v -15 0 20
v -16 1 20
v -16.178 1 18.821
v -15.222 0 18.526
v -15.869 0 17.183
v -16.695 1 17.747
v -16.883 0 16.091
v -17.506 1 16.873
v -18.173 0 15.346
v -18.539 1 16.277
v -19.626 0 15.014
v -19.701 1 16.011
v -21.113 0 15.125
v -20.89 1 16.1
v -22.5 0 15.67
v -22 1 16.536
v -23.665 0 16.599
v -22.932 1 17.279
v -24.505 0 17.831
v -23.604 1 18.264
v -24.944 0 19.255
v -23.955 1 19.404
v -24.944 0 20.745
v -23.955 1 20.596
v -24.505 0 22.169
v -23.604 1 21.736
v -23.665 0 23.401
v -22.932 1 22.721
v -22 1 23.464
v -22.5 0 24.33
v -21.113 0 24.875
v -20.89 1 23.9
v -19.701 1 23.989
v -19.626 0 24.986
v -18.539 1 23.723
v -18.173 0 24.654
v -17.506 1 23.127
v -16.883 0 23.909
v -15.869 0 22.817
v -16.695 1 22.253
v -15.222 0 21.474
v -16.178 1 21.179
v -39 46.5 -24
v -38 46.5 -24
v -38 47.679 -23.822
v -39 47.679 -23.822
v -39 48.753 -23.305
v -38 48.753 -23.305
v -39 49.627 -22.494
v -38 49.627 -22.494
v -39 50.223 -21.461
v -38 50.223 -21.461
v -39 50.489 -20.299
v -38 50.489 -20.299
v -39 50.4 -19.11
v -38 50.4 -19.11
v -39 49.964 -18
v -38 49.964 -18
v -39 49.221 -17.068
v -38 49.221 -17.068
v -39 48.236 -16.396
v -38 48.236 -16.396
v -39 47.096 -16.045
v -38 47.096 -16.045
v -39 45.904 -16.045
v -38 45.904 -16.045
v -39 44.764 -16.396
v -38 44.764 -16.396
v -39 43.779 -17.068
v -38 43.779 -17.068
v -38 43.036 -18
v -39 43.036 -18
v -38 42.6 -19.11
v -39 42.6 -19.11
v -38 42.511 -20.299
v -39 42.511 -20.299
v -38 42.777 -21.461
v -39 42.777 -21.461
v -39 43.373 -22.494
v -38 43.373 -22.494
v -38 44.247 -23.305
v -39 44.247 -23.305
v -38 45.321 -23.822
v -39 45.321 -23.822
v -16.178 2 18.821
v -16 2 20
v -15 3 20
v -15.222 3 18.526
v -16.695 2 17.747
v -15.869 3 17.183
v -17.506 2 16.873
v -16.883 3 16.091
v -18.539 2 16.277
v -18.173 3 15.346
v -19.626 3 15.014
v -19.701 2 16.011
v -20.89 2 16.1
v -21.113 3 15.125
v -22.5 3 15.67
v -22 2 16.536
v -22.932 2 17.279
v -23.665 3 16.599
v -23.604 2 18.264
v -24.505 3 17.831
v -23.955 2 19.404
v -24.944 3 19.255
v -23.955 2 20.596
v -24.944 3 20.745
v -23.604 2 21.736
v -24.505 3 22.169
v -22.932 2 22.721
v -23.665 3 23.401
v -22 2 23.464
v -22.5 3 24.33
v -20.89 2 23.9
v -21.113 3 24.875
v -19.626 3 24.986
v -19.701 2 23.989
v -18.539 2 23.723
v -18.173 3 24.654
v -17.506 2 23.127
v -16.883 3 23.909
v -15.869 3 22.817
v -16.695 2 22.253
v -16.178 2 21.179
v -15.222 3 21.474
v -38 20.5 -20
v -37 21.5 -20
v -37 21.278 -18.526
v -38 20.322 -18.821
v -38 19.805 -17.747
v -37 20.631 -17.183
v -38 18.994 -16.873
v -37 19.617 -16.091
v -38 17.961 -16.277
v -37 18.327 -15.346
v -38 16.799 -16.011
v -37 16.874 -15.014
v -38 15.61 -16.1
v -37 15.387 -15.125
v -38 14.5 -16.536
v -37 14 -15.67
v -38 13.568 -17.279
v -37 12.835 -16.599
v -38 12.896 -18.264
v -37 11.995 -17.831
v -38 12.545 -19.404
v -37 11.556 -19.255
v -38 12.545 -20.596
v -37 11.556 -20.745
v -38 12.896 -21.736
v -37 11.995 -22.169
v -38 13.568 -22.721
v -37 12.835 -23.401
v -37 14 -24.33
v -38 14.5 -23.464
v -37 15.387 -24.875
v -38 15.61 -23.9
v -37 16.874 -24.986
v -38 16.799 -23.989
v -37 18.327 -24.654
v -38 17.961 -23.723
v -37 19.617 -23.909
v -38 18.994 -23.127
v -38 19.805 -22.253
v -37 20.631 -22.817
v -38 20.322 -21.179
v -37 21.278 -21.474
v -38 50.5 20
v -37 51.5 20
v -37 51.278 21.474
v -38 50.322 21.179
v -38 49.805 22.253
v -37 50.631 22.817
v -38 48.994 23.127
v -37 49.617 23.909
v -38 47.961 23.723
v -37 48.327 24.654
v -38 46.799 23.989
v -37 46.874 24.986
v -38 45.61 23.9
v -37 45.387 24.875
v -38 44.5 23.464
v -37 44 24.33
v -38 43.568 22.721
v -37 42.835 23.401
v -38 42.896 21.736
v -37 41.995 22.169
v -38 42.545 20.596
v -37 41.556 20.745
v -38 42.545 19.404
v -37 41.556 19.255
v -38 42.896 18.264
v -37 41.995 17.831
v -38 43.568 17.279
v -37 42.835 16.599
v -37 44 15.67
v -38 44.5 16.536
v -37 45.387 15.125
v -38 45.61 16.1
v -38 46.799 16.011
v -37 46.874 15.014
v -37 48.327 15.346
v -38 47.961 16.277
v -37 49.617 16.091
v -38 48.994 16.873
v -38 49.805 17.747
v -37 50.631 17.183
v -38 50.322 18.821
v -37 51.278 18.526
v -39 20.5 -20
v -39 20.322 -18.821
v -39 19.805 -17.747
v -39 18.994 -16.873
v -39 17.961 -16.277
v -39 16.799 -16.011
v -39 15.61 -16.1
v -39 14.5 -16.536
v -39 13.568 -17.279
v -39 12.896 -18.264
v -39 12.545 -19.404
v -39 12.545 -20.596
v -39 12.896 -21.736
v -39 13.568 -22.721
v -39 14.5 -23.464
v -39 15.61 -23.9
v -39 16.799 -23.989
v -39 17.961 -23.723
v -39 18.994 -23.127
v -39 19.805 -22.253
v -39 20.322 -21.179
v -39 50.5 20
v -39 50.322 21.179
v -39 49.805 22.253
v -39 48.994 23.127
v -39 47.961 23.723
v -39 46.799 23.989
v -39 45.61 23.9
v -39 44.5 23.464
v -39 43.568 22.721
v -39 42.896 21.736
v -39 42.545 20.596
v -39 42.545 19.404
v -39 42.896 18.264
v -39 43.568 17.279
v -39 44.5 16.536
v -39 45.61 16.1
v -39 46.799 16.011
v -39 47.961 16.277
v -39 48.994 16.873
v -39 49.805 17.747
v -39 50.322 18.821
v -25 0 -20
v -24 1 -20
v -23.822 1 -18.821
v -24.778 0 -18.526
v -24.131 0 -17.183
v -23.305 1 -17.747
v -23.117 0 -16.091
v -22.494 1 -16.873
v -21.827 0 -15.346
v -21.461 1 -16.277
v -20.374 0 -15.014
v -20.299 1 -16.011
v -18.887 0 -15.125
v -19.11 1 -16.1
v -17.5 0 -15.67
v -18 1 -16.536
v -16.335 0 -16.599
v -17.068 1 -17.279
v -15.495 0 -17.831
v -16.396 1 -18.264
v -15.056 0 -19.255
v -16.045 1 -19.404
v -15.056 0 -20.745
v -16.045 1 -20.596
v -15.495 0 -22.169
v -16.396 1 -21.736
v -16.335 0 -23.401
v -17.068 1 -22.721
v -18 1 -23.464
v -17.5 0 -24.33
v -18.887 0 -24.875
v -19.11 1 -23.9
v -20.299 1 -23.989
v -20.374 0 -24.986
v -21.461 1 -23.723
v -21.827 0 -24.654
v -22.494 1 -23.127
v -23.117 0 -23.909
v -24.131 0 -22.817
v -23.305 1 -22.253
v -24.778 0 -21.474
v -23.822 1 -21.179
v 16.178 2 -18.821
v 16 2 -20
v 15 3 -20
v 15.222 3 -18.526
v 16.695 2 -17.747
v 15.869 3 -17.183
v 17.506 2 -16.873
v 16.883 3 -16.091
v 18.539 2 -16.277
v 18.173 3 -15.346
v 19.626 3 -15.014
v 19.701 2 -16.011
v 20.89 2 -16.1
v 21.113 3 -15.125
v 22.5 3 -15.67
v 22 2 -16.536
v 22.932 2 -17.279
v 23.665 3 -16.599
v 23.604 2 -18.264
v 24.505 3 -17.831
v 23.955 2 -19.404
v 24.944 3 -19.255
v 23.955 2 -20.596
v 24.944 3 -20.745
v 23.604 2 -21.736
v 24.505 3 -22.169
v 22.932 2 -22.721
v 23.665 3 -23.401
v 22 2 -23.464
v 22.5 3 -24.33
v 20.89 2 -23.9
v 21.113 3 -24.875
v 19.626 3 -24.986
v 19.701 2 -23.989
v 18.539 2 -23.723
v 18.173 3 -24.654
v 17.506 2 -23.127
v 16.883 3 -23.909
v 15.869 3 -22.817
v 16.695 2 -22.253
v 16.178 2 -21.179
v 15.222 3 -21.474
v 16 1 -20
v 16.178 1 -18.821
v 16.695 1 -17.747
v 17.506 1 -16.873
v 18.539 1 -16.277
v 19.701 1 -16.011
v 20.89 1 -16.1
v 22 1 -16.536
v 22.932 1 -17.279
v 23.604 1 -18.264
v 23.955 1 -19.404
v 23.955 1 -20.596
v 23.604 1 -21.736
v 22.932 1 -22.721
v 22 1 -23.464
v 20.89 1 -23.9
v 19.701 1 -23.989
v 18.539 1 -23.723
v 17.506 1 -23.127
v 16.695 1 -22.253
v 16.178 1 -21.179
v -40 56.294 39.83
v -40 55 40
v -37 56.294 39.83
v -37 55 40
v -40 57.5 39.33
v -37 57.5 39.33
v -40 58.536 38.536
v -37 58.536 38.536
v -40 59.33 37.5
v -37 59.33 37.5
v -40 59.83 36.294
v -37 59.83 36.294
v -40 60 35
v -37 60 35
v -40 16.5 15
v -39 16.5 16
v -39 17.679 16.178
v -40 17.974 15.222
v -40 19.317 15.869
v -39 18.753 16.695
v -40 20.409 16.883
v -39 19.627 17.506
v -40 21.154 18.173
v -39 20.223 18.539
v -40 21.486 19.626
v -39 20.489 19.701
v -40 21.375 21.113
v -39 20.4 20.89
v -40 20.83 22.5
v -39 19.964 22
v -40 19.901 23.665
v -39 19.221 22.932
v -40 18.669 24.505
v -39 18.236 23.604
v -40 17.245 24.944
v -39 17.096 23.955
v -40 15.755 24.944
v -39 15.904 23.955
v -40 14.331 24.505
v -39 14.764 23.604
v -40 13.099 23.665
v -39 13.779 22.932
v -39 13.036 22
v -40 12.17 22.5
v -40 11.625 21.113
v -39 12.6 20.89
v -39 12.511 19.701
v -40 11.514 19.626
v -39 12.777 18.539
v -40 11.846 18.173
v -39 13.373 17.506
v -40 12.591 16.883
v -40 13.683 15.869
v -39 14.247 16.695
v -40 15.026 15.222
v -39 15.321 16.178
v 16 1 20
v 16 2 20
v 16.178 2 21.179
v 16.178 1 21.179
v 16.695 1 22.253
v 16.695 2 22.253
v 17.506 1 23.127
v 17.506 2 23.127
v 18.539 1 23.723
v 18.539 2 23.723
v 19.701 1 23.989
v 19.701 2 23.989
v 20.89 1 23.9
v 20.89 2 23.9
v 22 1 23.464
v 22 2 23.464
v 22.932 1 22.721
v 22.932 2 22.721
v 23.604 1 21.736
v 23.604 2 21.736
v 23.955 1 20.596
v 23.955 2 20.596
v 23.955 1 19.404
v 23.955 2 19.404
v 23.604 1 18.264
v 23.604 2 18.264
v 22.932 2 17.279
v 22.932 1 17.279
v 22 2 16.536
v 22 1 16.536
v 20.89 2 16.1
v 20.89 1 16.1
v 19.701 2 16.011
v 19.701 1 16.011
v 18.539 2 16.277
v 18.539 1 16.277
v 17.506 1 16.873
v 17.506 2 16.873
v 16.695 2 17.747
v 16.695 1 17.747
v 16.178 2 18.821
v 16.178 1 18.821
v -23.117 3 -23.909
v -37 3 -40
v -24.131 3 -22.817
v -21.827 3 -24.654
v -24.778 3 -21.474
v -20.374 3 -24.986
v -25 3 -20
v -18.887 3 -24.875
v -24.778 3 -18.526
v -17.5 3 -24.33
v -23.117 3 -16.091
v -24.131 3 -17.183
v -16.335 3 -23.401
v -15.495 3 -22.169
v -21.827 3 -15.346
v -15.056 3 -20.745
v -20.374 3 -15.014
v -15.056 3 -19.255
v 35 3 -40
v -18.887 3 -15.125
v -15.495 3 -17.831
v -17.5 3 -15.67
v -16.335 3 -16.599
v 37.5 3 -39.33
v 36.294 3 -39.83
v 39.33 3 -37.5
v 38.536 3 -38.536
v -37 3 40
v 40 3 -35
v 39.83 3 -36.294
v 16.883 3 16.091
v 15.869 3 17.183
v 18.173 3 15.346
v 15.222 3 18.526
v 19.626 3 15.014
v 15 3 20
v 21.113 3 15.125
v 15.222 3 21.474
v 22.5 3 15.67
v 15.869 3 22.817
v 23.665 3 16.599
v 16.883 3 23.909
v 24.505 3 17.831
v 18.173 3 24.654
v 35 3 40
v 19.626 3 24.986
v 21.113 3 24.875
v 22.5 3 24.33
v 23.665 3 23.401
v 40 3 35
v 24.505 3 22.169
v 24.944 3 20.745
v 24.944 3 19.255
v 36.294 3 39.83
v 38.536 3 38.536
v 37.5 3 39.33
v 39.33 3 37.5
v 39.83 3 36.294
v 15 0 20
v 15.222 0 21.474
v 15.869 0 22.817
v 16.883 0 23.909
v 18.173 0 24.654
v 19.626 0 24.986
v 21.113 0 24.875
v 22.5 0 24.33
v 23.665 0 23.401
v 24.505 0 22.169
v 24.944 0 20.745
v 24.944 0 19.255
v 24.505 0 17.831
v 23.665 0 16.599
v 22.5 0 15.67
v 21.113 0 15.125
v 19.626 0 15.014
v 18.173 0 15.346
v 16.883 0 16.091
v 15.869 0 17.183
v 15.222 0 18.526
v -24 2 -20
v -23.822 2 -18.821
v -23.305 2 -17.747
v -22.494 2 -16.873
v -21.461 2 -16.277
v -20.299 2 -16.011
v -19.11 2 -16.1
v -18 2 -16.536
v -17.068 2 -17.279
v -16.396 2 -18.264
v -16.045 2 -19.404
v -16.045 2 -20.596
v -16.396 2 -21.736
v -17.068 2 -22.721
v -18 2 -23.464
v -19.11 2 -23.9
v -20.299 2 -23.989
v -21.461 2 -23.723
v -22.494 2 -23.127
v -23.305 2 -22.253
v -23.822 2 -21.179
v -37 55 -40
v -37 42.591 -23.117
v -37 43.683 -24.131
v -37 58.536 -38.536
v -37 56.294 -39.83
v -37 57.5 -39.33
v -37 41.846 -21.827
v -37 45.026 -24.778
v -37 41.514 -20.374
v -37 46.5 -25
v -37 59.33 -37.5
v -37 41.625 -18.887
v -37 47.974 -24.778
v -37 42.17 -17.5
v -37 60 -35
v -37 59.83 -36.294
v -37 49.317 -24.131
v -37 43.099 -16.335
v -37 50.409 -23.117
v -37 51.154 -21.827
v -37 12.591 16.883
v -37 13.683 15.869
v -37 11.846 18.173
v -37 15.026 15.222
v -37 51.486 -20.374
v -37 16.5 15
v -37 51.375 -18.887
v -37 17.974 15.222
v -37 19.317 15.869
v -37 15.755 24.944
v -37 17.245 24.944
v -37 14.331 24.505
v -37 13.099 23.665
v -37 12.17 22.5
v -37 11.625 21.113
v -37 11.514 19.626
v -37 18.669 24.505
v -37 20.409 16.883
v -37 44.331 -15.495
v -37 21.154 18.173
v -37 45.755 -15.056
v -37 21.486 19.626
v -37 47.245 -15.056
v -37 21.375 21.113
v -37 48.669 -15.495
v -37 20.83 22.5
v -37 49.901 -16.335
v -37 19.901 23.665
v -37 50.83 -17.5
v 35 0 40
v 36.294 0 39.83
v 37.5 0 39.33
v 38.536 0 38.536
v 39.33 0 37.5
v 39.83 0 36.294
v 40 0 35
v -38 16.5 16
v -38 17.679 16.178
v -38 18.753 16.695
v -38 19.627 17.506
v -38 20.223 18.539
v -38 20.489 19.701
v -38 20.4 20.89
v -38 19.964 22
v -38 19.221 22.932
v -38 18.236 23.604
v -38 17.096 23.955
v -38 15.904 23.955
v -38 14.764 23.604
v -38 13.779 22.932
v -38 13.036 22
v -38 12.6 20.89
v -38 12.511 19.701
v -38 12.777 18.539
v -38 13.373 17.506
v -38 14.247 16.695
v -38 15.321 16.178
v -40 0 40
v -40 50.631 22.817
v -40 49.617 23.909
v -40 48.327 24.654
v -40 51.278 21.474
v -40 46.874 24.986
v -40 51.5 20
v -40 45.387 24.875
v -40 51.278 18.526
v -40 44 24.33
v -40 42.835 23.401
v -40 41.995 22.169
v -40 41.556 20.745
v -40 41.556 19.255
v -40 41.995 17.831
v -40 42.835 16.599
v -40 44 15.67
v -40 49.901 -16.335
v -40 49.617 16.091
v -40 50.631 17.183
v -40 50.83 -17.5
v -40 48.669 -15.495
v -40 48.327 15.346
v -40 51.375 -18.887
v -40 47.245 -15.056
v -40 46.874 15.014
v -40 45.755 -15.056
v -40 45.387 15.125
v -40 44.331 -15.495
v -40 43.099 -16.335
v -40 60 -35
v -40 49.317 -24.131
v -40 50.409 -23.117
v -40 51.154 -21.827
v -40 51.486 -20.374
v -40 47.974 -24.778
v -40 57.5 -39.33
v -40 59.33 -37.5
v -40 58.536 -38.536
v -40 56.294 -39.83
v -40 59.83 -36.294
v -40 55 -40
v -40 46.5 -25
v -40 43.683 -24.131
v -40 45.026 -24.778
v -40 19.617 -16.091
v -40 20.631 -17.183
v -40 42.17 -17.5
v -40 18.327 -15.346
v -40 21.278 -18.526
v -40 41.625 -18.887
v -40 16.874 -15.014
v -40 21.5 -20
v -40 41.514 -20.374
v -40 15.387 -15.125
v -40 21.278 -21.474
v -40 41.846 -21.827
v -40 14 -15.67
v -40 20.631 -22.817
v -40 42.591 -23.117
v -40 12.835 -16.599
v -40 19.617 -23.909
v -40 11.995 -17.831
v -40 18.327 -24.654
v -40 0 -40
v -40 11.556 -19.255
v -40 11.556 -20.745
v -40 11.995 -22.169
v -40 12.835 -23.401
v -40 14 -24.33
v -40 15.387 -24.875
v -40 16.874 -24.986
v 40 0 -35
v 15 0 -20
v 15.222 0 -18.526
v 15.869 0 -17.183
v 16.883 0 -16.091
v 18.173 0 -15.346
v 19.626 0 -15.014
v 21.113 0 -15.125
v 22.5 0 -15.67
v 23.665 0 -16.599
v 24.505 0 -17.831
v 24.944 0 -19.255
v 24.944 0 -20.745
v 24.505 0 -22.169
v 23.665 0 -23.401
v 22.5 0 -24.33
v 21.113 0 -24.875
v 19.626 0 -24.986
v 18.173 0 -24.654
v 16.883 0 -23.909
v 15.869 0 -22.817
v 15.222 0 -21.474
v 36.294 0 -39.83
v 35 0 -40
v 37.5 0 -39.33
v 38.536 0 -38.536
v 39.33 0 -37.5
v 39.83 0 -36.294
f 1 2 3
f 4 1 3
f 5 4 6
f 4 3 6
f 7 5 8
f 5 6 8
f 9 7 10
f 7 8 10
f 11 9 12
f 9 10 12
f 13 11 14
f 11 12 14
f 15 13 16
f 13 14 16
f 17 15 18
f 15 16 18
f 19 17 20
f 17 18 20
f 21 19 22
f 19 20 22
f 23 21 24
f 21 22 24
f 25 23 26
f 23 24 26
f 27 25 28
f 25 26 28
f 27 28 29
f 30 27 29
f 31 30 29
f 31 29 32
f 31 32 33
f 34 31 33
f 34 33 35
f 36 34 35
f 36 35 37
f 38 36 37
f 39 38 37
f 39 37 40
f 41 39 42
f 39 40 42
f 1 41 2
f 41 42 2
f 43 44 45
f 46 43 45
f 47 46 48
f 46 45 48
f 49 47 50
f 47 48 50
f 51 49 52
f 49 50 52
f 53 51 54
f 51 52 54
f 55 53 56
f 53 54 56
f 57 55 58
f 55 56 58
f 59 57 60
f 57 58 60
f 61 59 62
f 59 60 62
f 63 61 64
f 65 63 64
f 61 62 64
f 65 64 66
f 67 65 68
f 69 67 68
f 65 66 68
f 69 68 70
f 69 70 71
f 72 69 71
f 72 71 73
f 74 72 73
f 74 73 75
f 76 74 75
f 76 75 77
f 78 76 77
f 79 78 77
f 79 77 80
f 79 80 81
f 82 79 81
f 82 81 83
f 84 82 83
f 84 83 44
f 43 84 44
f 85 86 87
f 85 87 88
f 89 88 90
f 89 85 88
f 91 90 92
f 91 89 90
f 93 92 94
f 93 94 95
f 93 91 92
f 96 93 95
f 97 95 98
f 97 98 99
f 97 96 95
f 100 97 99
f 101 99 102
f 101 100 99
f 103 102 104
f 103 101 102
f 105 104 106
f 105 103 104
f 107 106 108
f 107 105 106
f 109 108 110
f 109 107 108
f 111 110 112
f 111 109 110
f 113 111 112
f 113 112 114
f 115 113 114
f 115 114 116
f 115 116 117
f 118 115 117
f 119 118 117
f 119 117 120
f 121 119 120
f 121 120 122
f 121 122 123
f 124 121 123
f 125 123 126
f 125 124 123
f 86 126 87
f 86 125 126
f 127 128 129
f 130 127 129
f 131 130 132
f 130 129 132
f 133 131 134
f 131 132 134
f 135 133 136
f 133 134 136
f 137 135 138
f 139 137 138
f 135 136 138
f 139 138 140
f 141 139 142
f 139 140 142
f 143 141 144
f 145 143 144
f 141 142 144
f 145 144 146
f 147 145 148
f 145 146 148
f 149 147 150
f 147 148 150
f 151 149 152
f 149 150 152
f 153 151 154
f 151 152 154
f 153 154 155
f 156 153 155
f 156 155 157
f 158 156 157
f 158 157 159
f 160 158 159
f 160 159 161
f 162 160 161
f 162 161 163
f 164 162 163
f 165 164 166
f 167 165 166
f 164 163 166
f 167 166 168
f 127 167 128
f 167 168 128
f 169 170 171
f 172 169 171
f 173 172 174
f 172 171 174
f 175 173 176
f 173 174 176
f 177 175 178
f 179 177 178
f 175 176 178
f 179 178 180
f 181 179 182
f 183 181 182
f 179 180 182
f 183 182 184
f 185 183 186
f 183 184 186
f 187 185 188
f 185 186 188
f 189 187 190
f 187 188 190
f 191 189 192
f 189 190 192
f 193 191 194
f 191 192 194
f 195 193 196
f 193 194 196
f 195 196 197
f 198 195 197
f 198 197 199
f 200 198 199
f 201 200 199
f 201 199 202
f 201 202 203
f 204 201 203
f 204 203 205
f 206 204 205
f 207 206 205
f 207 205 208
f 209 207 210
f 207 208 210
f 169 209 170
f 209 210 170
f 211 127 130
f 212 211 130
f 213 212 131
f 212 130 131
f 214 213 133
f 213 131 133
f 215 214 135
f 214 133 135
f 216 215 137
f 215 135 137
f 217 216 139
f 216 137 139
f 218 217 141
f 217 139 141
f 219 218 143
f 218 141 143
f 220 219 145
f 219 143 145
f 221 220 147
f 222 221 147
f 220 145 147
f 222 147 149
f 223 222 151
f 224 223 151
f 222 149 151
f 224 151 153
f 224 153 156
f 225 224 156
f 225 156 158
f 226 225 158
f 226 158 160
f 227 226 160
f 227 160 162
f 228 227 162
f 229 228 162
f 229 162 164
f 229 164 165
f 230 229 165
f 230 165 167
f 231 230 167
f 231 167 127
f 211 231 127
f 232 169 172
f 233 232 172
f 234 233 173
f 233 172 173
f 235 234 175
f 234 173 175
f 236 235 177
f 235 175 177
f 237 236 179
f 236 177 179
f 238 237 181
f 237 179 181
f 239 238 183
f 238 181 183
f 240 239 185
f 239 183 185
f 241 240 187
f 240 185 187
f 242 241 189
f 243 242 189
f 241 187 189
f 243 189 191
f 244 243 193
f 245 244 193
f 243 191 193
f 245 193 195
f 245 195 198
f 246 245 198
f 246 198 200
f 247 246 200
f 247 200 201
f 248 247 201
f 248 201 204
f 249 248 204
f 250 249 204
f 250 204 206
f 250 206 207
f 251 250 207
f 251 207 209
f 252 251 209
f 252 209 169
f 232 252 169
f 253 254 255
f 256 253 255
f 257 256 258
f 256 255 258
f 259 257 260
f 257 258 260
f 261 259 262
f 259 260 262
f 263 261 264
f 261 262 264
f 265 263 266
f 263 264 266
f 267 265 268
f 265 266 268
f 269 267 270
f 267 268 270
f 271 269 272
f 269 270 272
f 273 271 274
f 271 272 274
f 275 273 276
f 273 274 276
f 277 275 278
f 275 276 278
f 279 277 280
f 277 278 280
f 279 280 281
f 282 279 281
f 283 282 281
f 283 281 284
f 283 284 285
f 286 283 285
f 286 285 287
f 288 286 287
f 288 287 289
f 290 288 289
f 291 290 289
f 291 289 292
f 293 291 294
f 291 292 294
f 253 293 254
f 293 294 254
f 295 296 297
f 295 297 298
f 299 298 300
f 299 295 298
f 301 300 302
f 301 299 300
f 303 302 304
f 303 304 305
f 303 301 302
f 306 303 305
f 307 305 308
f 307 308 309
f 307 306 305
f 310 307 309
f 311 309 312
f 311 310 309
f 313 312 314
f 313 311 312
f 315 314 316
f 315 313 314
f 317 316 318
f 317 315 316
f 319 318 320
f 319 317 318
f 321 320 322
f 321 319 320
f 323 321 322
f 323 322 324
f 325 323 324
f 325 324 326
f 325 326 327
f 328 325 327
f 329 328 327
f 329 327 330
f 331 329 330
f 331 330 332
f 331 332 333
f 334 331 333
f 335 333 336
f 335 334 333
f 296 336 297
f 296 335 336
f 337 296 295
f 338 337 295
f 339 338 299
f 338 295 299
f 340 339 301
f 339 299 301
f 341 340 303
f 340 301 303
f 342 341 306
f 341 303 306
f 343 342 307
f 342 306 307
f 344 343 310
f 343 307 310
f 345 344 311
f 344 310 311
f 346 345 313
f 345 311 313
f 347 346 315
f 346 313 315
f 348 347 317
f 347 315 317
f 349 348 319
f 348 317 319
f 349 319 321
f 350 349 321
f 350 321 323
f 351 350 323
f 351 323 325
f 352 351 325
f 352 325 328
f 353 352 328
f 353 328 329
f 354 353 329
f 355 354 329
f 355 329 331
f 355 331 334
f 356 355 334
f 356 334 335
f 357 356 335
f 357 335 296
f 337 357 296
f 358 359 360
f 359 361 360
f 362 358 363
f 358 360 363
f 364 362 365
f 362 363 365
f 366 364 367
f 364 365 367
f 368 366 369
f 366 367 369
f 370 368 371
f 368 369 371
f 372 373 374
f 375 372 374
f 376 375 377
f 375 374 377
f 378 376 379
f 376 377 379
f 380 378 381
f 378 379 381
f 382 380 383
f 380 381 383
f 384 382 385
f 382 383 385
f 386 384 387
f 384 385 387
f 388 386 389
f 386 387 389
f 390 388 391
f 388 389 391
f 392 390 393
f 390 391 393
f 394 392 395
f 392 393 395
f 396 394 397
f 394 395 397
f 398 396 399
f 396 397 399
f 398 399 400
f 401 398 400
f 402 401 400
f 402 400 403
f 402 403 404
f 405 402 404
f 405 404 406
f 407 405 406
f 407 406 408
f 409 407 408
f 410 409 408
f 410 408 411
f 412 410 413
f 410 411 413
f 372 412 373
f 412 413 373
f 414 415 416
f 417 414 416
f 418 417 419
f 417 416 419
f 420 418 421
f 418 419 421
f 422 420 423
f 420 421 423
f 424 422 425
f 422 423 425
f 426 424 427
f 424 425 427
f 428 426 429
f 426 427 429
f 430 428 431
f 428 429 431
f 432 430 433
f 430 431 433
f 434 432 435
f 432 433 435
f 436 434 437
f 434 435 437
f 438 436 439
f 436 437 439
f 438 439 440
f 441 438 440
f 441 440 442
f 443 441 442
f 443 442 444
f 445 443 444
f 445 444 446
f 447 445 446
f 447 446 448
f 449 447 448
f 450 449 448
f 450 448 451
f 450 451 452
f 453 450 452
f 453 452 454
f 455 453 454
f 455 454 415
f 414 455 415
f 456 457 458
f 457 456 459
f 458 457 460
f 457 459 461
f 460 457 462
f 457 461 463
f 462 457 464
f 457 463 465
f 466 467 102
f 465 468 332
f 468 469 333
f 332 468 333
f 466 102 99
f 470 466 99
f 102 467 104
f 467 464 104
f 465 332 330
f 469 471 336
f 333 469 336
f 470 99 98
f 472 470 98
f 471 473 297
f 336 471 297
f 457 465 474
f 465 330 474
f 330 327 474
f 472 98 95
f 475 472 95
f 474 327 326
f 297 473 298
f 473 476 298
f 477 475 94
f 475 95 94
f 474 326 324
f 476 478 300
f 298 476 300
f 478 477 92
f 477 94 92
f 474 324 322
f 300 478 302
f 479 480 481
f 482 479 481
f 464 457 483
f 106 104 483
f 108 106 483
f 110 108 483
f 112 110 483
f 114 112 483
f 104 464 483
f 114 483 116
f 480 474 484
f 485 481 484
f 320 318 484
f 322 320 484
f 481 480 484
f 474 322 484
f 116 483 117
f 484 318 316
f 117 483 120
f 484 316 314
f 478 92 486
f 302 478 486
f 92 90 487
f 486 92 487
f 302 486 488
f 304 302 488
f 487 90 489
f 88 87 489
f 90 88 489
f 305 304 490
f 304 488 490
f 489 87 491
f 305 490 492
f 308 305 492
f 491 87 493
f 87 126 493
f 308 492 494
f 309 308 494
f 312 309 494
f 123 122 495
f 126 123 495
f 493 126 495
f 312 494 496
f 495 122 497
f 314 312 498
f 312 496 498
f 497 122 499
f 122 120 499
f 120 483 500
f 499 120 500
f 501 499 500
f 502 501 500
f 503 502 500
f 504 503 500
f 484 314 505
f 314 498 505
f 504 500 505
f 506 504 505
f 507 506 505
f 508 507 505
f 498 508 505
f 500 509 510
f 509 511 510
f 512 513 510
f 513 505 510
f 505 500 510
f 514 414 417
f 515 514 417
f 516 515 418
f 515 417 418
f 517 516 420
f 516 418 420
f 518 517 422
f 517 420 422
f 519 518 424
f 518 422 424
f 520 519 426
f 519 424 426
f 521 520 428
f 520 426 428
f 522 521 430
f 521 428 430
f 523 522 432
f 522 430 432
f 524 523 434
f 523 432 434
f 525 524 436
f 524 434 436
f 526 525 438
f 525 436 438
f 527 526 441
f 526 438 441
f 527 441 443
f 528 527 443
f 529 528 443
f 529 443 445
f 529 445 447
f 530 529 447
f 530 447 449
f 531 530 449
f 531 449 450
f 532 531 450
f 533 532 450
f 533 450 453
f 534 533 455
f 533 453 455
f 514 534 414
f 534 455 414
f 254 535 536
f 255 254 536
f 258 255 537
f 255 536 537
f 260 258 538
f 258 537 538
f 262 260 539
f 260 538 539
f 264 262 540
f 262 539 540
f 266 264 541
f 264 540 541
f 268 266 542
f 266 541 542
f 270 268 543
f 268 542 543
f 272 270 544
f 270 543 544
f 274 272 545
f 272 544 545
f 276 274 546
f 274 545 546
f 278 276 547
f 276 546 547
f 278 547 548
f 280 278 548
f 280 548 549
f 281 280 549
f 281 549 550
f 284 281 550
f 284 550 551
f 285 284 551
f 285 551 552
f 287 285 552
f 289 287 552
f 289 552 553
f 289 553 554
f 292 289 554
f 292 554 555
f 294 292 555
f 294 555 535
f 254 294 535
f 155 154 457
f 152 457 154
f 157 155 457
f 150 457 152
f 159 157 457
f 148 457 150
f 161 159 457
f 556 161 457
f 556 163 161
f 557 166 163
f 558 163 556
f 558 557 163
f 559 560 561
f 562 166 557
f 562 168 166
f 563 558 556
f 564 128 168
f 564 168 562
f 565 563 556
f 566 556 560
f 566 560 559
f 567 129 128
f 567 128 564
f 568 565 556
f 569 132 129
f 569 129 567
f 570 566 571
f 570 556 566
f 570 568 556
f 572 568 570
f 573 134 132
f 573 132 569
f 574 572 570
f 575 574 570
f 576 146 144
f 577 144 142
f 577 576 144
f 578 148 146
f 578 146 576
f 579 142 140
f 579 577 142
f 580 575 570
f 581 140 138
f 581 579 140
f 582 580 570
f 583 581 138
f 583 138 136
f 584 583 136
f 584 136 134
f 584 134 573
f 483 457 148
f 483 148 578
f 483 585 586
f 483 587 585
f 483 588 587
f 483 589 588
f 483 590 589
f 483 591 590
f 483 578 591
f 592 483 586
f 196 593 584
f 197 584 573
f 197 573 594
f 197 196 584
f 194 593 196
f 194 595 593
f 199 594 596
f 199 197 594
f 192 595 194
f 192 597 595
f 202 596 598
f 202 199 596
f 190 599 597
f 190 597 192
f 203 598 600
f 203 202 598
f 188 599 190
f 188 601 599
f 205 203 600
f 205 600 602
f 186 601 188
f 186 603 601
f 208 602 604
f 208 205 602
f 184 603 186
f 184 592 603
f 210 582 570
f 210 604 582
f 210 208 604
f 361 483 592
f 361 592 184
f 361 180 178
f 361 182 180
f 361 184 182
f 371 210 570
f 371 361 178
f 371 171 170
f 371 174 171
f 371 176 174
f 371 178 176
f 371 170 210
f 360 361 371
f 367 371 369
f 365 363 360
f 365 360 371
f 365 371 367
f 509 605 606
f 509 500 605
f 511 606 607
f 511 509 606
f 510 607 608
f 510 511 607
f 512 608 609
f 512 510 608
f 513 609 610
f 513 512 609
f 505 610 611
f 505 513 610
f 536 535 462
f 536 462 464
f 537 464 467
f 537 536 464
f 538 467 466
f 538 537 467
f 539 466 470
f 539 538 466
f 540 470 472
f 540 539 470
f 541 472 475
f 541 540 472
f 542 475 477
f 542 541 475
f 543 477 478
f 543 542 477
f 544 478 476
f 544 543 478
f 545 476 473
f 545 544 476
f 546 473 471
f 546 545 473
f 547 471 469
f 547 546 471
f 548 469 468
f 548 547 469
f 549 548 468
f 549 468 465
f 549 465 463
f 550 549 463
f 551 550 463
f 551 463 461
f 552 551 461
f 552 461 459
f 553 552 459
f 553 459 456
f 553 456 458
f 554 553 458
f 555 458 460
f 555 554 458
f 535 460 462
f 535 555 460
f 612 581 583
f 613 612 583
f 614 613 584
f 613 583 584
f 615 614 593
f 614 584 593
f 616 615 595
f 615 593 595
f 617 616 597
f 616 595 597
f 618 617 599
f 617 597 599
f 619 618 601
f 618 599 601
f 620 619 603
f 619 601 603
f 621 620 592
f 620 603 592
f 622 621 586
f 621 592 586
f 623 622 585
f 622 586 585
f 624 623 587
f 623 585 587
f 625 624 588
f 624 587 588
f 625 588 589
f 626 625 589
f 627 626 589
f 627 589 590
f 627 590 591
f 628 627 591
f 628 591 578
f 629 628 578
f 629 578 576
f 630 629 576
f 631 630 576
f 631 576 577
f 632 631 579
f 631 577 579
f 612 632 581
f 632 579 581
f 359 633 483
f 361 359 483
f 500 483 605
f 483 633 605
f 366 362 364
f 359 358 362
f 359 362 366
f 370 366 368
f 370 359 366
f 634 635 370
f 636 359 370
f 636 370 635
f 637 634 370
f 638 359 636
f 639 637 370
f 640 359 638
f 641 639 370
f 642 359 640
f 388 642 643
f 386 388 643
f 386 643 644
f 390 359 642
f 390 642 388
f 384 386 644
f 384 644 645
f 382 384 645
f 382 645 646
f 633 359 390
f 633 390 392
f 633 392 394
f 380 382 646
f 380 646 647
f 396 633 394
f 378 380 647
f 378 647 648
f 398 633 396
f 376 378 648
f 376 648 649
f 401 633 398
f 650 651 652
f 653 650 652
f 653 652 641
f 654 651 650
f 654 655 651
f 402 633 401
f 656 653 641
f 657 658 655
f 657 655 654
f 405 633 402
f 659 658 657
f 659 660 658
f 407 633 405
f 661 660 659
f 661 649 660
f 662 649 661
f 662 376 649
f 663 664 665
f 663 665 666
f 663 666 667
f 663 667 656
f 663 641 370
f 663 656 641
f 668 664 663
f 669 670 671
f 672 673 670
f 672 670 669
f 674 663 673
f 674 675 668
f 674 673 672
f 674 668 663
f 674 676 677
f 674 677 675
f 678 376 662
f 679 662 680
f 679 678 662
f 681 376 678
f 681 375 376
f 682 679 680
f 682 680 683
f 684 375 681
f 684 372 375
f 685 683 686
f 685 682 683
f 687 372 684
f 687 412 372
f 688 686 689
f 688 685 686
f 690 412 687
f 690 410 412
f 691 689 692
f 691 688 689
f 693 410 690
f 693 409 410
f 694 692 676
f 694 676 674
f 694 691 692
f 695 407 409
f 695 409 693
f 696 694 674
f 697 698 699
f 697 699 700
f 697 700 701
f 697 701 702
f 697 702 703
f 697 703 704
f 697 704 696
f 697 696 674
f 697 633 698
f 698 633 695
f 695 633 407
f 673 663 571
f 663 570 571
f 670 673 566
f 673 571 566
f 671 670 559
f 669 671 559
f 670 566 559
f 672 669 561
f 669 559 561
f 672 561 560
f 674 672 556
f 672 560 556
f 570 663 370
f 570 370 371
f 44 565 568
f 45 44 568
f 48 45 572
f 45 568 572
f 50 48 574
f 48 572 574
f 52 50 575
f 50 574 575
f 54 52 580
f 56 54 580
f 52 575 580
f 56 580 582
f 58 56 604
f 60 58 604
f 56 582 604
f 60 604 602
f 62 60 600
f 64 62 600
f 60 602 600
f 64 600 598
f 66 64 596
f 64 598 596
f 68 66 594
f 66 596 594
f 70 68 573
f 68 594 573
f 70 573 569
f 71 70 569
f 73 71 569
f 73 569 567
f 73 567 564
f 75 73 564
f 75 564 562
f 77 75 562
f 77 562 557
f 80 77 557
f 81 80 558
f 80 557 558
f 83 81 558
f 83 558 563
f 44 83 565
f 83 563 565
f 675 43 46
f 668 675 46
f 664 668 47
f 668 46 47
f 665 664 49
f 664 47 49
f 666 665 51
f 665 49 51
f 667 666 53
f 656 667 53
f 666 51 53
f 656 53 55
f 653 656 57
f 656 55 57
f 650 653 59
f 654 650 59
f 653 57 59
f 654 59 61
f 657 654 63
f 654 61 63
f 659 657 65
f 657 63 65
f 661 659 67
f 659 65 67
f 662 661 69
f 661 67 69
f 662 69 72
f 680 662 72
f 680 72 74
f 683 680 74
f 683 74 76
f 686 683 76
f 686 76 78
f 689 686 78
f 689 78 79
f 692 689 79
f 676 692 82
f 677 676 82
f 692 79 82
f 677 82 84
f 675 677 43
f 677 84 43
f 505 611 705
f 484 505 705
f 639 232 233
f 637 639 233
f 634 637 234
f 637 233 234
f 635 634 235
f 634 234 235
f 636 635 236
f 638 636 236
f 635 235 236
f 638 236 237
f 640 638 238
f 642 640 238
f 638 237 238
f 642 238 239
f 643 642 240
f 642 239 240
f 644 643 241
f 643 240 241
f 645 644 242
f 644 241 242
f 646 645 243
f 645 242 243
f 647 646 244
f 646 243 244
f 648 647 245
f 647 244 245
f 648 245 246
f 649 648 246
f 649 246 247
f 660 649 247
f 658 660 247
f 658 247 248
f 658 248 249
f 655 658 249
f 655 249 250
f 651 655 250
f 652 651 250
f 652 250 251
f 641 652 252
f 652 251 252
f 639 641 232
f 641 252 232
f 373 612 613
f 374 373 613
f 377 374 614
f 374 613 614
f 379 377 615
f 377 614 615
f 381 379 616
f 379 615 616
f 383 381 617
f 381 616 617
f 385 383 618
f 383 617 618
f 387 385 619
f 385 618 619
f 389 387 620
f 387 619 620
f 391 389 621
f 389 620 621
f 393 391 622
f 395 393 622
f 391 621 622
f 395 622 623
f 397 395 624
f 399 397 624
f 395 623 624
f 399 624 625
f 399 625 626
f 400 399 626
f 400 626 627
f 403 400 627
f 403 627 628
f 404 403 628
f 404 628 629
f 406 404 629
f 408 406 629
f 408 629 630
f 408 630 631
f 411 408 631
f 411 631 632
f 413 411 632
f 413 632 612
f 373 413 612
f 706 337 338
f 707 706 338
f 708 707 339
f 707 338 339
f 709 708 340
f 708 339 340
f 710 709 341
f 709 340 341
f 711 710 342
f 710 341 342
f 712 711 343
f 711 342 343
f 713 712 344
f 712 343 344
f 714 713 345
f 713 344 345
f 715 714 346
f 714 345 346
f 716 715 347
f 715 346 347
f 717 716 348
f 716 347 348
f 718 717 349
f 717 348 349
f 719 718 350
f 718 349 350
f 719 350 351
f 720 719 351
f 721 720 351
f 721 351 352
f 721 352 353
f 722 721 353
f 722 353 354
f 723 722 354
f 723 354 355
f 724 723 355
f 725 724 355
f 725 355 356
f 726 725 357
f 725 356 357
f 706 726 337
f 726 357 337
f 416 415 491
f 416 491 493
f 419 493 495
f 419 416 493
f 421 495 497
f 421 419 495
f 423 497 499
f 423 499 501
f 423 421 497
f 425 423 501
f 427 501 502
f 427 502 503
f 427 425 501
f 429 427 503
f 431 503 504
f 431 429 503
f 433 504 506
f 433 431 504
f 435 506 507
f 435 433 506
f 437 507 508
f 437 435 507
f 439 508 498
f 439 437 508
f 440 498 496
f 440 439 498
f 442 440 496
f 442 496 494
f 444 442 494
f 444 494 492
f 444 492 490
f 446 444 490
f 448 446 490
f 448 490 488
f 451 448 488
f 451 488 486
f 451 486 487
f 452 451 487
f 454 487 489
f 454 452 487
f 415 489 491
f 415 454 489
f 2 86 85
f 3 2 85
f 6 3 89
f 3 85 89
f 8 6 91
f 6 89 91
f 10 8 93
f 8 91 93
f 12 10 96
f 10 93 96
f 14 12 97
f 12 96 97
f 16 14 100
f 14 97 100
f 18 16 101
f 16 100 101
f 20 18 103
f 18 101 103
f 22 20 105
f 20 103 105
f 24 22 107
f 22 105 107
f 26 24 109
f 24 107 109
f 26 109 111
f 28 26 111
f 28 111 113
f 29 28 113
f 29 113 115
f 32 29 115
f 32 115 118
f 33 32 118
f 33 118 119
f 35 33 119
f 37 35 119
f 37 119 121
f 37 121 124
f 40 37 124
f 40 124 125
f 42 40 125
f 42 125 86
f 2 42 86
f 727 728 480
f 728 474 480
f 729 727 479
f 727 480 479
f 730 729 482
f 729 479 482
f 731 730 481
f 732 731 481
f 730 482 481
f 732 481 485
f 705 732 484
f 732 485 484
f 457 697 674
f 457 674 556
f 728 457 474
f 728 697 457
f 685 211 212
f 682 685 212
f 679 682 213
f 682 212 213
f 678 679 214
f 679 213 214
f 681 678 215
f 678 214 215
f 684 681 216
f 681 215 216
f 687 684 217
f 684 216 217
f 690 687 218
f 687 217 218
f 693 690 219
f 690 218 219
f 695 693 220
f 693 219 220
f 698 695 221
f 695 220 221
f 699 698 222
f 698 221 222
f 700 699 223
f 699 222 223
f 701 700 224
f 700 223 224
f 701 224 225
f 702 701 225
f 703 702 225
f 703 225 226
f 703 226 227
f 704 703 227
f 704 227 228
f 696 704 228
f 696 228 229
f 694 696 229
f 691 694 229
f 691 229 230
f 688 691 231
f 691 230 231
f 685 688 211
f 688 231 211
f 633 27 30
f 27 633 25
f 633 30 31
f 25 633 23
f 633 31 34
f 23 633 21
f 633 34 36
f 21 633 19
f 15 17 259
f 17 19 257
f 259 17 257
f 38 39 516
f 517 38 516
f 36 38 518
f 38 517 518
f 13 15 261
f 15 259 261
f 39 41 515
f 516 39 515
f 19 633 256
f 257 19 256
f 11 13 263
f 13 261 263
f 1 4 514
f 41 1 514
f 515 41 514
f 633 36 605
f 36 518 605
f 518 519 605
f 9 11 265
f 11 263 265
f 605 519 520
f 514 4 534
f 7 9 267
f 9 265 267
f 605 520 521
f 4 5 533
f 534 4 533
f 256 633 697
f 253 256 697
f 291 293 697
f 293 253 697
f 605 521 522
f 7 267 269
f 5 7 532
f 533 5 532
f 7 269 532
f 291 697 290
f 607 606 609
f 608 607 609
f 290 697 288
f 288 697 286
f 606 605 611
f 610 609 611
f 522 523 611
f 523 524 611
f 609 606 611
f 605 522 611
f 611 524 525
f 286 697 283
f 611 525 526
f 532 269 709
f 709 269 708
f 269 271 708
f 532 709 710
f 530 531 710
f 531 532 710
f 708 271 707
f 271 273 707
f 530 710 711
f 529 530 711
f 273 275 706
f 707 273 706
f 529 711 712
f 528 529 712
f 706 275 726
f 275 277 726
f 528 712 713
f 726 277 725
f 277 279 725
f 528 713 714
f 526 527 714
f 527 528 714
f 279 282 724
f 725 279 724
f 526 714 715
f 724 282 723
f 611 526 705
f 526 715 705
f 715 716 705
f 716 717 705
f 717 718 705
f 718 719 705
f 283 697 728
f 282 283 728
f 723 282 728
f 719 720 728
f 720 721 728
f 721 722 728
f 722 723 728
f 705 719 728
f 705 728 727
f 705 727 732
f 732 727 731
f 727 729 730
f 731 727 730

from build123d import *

# Parameters (mm, degrees)
SZKIC1_W                    = 80
SZKIC1_H                    = 80
DODANIE_WYCI_GNI_CIE1_DEPTH = 60
SZKIC2_W                    = 77
SZKIC2_H                    = 57
WYTNIJ_WYCI_GNI_CIE1_DEPTH  = 108.703296143
SZKIC4_R                    = 4
WYTNIJ_WYCI_GNI_CIE2_DEPTH  = 81.305666052
SZKIC3_R                    = 4
WYTNIJ_WYCI_GNI_CIE3_DEPTH  = 60
ZAOKR_GLENIE1_R             = 5
SFAZOWANIE1_SIZE            = 1


with BuildPart() as part:
    # Szkic1 → Dodanie-wyciągnięcie1 (new body)
    with BuildSketch(Plane(origin=(0, 0, 0), x_dir=(1, 0, 0), z_dir=(0, 1, 0))):
        Rectangle(SZKIC1_W, SZKIC1_H)
    extrude(amount=DODANIE_WYCI_GNI_CIE1_DEPTH)

    # Szkic2 → Wytnij-wyciągnięcie1 (cut, through all)
    with BuildSketch(Plane.XY.offset(40)):
        with Locations((1.5, 31.5)):
            Rectangle(SZKIC2_W, SZKIC2_H)
    extrude(amount=-WYTNIJ_WYCI_GNI_CIE1_DEPTH, mode=Mode.SUBTRACT)

    # Szkic4 → Wytnij-wyciągnięcie2 (cut, through all)
    with BuildSketch(Plane(origin=(0, 3, 0), x_dir=(1, 0, 0), z_dir=(0, 1, 0))):
        with Locations(Location((20, -20, 0), (0, 0, 180))):
            Circle(SZKIC4_R)
        with Locations(Location((20, 20, 0), (0, 0, 180))):
            Circle(SZKIC4_R)
        with Locations(Location((-20, 20, 0), (0, 0, 180))):
            Circle(SZKIC4_R)
        with Locations((-20, -20)):
            Circle(SZKIC4_R)
    extrude(amount=-WYTNIJ_WYCI_GNI_CIE2_DEPTH, mode=Mode.SUBTRACT)

    # Szkic3 → Wytnij-wyciągnięcie3 (cut)
    with BuildSketch(Plane(origin=(-37, 0, 0), x_dir=(0, 0, -1), z_dir=(1, 0, 0))):
        with Locations(Location((-20, 46.5, 0), (0, 0, 90))):
            Circle(SZKIC3_R)
        with Locations((-20, 16.5)):
            Circle(SZKIC3_R)
        with Locations(Location((20, 16.5, 0), (0, 0, 90))):
            Circle(SZKIC3_R)
        with Locations((20, 46.5)):
            Circle(SZKIC3_R)
    extrude(amount=-WYTNIJ_WYCI_GNI_CIE3_DEPTH, mode=Mode.SUBTRACT)

    # Zaokrąglenie1
    zaokr_glenie1_edges = [part.edges().sort_by_distance(p)[0] for p in [
        (-38.5, 60, -40),
        (40, 1.5, 40),
        (40, 1.5, -40),
        (-38.5, 60, 40),
    ]]
    fillet(zaokr_glenie1_edges, radius=ZAOKR_GLENIE1_R)

    # Sfazowanie1
    sfazowanie1_edges = [part.edges().sort_by_distance(p)[0] for p in [
        (-24, 3, 20),
        (-24, 0, 20),
        (-16, 0, -20),
        (-16, 3, -20),
        (24, 3, -20),
        (24, 0, -20),
        (24, 0, 20),
        (24, 3, 20),
        (-40, 46.5, -16),
        (-37, 46.5, -16),
        (-40, 12.5, -20),
        (-37, 12.5, -20),
        (-40, 16.5, 24),
        (-37, 16.5, 24),
        (-40, 42.5, 20),
        (-37, 42.5, 20),
    ]]
    chamfer(sfazowanie1_edges, length=SFAZOWANIE1_SIZE)


solid = part.part
